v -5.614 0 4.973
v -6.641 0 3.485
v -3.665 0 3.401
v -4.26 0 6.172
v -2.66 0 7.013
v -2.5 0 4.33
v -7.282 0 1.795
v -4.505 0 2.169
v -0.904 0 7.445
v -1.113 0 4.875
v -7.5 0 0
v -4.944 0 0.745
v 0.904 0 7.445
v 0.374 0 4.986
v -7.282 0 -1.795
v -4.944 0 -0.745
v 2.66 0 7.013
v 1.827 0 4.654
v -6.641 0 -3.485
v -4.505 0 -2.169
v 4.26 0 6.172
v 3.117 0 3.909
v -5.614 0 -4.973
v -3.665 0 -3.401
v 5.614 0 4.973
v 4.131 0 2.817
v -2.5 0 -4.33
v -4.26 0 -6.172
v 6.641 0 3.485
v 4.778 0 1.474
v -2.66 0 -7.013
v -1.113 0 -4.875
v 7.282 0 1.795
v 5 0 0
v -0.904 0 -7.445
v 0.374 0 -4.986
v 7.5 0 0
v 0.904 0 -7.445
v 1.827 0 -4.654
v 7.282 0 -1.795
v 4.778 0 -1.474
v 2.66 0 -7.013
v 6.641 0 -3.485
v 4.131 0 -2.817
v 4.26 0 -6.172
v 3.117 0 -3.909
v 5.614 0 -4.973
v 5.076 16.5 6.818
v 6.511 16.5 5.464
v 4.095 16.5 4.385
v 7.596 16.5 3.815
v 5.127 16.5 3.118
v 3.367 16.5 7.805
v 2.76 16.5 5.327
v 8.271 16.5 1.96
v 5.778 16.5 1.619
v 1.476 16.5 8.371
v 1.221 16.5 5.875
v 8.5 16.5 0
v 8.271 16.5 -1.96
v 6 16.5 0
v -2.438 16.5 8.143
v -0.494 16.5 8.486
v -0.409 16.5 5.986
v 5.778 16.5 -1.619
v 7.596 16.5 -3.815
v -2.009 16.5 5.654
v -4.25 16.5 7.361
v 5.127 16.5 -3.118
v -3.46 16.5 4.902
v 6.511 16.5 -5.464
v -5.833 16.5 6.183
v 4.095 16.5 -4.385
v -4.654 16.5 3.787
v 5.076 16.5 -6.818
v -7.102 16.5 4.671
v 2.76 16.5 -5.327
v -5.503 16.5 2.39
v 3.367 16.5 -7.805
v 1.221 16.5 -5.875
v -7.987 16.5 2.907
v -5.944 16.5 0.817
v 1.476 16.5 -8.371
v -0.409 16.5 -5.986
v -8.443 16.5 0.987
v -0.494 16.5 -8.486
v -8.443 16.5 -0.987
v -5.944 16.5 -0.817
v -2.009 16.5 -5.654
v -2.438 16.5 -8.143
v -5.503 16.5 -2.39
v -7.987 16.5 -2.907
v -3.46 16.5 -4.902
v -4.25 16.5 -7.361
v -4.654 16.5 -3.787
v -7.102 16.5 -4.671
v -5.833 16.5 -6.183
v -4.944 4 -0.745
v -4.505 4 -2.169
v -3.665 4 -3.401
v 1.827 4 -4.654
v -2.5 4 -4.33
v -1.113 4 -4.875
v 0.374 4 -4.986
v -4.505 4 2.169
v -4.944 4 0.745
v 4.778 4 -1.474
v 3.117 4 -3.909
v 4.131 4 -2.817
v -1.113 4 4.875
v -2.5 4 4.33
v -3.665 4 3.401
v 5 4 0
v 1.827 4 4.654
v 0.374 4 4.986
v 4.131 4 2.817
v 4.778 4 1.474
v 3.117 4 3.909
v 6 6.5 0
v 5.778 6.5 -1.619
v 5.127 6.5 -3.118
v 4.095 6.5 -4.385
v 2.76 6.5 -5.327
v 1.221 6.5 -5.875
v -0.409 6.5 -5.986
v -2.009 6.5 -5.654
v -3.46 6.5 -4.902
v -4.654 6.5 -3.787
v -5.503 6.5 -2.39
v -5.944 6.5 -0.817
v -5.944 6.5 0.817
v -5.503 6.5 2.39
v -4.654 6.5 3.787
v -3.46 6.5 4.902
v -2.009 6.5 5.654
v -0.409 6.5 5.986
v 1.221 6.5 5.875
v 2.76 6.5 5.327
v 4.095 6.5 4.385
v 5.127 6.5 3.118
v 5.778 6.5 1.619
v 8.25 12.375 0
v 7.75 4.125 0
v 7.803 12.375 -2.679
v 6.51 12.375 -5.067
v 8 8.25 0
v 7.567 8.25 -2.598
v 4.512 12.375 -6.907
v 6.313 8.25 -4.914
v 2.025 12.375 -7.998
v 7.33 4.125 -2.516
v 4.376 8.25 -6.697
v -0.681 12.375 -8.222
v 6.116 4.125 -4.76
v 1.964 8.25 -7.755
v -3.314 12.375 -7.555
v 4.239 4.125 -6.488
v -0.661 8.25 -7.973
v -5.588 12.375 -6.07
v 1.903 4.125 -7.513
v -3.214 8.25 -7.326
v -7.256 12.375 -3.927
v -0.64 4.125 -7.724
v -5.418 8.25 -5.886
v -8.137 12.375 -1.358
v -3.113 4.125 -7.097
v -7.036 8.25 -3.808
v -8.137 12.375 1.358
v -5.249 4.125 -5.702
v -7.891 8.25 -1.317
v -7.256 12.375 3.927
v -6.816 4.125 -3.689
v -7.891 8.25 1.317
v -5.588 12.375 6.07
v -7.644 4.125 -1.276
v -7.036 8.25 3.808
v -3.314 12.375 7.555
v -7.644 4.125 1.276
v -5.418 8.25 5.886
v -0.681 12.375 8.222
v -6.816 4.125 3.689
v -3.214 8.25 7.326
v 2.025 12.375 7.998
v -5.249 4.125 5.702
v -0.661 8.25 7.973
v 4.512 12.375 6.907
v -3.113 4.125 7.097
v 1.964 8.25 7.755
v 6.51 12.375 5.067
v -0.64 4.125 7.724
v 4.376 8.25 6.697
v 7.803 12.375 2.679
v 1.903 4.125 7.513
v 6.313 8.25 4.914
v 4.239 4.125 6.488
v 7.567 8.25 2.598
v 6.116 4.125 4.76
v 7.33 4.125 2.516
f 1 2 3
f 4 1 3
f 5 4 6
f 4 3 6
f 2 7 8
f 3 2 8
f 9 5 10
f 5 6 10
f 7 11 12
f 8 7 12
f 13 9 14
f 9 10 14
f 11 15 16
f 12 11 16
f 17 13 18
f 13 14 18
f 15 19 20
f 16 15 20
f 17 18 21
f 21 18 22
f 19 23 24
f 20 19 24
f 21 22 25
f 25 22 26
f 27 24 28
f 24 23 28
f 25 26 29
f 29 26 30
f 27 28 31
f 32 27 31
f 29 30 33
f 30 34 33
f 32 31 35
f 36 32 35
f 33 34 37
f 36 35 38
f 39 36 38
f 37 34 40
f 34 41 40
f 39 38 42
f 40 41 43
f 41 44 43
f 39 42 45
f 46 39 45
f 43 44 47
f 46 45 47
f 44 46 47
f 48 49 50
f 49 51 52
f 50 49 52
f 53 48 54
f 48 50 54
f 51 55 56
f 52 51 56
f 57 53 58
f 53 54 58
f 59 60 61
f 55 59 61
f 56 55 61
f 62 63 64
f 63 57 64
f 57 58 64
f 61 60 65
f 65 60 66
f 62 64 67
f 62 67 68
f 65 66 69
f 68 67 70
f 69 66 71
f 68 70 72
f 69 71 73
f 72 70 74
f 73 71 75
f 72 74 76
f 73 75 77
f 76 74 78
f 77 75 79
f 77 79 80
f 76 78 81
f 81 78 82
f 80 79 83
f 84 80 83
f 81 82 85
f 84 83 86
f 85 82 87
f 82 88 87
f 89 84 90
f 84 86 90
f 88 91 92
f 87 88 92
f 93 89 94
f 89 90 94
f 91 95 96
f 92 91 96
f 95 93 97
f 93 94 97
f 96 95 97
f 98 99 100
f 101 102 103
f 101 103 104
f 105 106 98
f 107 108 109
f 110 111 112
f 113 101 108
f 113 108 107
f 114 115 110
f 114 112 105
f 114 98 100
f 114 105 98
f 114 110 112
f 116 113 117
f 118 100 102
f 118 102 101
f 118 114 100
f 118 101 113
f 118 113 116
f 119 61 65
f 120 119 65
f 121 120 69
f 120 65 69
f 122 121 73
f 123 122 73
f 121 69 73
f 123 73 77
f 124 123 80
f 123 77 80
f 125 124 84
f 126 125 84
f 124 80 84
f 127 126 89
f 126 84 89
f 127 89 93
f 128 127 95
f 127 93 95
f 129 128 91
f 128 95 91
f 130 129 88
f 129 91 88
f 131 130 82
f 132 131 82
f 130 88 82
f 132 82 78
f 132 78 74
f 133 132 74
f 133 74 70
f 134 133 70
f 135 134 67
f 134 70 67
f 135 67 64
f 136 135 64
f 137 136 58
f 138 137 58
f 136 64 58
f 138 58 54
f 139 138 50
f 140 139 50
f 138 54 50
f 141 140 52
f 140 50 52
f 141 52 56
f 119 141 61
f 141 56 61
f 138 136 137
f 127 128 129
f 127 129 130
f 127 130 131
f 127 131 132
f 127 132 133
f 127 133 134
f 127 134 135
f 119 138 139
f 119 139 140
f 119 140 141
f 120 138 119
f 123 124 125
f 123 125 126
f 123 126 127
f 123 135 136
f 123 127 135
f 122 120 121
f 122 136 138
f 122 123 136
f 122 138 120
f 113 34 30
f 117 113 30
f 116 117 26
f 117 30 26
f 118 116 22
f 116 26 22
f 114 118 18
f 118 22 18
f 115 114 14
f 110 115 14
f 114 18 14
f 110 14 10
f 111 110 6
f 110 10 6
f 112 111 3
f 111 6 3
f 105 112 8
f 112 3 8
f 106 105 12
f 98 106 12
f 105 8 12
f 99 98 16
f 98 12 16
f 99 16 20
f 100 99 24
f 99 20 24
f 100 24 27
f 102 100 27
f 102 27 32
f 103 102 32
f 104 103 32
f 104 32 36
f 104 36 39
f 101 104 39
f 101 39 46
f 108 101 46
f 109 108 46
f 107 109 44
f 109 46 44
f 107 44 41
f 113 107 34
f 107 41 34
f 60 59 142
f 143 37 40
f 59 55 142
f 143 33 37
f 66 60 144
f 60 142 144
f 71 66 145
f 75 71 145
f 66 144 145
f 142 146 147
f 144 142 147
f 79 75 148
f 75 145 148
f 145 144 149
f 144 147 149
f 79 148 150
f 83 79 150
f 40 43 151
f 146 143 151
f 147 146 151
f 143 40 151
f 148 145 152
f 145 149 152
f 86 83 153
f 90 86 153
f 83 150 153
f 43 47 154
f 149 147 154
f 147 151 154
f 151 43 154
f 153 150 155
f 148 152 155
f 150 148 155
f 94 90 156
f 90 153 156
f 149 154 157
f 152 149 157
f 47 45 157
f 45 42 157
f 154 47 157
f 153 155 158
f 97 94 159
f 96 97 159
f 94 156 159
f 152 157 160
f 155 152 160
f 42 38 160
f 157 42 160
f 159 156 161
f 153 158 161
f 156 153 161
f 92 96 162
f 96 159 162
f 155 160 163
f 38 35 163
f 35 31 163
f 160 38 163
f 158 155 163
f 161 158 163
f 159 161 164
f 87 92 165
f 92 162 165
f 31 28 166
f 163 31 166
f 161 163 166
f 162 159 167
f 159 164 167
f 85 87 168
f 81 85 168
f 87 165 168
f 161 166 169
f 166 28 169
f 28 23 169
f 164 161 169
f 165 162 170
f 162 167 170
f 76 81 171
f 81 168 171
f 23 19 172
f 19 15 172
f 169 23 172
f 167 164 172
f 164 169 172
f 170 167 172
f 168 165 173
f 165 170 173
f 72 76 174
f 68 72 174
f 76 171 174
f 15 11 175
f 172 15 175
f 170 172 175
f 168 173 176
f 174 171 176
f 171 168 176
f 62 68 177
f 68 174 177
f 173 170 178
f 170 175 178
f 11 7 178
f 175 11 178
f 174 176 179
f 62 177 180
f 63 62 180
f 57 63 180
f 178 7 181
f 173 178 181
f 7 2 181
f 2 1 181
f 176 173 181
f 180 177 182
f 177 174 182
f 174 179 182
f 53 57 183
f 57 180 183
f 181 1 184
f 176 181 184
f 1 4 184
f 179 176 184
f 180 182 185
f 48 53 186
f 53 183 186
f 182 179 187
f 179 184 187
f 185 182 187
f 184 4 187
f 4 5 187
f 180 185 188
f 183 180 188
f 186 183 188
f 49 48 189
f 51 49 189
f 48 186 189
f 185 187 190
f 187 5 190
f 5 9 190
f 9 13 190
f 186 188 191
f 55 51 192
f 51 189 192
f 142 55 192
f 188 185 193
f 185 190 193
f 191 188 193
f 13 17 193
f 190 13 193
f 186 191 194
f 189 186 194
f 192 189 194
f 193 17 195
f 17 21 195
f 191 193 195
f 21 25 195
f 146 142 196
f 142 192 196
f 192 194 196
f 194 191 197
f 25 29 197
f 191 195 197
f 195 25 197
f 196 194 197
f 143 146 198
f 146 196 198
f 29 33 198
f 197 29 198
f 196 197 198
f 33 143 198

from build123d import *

# Parameters (mm, degrees)
ESBO_O2_R             = 6
CORTE_EXTRUS_O1_DEPTH = 10
ESBO_O3_R             = 5
CORTE_EXTRUS_O2_DEPTH = 4


with BuildPart() as part:
    # Esboço1 → Revolução1 (revolve)
    with BuildSketch(Plane.XY):
        Polygon((0, 0), (0, 16.5), (8.5, 16.5), (7.5, 0), align=None)
    revolve(axis=Axis((0, 0, 0), (0, 1, 0)))

    # Esboço2 → Corte-extrusão1 (cut)
    with BuildSketch(Plane(origin=(0, 16.5, 0), x_dir=(1, 0, 0), z_dir=(0, 1, 0))):
        Circle(ESBO_O2_R)
    extrude(amount=-CORTE_EXTRUS_O1_DEPTH, mode=Mode.SUBTRACT)

    # Esboço3 → Corte-extrusão2 (cut)
    with BuildSketch(Plane.XZ):
        Circle(ESBO_O3_R)
    extrude(amount=-CORTE_EXTRUS_O2_DEPTH, mode=Mode.SUBTRACT)


solid = part.part
